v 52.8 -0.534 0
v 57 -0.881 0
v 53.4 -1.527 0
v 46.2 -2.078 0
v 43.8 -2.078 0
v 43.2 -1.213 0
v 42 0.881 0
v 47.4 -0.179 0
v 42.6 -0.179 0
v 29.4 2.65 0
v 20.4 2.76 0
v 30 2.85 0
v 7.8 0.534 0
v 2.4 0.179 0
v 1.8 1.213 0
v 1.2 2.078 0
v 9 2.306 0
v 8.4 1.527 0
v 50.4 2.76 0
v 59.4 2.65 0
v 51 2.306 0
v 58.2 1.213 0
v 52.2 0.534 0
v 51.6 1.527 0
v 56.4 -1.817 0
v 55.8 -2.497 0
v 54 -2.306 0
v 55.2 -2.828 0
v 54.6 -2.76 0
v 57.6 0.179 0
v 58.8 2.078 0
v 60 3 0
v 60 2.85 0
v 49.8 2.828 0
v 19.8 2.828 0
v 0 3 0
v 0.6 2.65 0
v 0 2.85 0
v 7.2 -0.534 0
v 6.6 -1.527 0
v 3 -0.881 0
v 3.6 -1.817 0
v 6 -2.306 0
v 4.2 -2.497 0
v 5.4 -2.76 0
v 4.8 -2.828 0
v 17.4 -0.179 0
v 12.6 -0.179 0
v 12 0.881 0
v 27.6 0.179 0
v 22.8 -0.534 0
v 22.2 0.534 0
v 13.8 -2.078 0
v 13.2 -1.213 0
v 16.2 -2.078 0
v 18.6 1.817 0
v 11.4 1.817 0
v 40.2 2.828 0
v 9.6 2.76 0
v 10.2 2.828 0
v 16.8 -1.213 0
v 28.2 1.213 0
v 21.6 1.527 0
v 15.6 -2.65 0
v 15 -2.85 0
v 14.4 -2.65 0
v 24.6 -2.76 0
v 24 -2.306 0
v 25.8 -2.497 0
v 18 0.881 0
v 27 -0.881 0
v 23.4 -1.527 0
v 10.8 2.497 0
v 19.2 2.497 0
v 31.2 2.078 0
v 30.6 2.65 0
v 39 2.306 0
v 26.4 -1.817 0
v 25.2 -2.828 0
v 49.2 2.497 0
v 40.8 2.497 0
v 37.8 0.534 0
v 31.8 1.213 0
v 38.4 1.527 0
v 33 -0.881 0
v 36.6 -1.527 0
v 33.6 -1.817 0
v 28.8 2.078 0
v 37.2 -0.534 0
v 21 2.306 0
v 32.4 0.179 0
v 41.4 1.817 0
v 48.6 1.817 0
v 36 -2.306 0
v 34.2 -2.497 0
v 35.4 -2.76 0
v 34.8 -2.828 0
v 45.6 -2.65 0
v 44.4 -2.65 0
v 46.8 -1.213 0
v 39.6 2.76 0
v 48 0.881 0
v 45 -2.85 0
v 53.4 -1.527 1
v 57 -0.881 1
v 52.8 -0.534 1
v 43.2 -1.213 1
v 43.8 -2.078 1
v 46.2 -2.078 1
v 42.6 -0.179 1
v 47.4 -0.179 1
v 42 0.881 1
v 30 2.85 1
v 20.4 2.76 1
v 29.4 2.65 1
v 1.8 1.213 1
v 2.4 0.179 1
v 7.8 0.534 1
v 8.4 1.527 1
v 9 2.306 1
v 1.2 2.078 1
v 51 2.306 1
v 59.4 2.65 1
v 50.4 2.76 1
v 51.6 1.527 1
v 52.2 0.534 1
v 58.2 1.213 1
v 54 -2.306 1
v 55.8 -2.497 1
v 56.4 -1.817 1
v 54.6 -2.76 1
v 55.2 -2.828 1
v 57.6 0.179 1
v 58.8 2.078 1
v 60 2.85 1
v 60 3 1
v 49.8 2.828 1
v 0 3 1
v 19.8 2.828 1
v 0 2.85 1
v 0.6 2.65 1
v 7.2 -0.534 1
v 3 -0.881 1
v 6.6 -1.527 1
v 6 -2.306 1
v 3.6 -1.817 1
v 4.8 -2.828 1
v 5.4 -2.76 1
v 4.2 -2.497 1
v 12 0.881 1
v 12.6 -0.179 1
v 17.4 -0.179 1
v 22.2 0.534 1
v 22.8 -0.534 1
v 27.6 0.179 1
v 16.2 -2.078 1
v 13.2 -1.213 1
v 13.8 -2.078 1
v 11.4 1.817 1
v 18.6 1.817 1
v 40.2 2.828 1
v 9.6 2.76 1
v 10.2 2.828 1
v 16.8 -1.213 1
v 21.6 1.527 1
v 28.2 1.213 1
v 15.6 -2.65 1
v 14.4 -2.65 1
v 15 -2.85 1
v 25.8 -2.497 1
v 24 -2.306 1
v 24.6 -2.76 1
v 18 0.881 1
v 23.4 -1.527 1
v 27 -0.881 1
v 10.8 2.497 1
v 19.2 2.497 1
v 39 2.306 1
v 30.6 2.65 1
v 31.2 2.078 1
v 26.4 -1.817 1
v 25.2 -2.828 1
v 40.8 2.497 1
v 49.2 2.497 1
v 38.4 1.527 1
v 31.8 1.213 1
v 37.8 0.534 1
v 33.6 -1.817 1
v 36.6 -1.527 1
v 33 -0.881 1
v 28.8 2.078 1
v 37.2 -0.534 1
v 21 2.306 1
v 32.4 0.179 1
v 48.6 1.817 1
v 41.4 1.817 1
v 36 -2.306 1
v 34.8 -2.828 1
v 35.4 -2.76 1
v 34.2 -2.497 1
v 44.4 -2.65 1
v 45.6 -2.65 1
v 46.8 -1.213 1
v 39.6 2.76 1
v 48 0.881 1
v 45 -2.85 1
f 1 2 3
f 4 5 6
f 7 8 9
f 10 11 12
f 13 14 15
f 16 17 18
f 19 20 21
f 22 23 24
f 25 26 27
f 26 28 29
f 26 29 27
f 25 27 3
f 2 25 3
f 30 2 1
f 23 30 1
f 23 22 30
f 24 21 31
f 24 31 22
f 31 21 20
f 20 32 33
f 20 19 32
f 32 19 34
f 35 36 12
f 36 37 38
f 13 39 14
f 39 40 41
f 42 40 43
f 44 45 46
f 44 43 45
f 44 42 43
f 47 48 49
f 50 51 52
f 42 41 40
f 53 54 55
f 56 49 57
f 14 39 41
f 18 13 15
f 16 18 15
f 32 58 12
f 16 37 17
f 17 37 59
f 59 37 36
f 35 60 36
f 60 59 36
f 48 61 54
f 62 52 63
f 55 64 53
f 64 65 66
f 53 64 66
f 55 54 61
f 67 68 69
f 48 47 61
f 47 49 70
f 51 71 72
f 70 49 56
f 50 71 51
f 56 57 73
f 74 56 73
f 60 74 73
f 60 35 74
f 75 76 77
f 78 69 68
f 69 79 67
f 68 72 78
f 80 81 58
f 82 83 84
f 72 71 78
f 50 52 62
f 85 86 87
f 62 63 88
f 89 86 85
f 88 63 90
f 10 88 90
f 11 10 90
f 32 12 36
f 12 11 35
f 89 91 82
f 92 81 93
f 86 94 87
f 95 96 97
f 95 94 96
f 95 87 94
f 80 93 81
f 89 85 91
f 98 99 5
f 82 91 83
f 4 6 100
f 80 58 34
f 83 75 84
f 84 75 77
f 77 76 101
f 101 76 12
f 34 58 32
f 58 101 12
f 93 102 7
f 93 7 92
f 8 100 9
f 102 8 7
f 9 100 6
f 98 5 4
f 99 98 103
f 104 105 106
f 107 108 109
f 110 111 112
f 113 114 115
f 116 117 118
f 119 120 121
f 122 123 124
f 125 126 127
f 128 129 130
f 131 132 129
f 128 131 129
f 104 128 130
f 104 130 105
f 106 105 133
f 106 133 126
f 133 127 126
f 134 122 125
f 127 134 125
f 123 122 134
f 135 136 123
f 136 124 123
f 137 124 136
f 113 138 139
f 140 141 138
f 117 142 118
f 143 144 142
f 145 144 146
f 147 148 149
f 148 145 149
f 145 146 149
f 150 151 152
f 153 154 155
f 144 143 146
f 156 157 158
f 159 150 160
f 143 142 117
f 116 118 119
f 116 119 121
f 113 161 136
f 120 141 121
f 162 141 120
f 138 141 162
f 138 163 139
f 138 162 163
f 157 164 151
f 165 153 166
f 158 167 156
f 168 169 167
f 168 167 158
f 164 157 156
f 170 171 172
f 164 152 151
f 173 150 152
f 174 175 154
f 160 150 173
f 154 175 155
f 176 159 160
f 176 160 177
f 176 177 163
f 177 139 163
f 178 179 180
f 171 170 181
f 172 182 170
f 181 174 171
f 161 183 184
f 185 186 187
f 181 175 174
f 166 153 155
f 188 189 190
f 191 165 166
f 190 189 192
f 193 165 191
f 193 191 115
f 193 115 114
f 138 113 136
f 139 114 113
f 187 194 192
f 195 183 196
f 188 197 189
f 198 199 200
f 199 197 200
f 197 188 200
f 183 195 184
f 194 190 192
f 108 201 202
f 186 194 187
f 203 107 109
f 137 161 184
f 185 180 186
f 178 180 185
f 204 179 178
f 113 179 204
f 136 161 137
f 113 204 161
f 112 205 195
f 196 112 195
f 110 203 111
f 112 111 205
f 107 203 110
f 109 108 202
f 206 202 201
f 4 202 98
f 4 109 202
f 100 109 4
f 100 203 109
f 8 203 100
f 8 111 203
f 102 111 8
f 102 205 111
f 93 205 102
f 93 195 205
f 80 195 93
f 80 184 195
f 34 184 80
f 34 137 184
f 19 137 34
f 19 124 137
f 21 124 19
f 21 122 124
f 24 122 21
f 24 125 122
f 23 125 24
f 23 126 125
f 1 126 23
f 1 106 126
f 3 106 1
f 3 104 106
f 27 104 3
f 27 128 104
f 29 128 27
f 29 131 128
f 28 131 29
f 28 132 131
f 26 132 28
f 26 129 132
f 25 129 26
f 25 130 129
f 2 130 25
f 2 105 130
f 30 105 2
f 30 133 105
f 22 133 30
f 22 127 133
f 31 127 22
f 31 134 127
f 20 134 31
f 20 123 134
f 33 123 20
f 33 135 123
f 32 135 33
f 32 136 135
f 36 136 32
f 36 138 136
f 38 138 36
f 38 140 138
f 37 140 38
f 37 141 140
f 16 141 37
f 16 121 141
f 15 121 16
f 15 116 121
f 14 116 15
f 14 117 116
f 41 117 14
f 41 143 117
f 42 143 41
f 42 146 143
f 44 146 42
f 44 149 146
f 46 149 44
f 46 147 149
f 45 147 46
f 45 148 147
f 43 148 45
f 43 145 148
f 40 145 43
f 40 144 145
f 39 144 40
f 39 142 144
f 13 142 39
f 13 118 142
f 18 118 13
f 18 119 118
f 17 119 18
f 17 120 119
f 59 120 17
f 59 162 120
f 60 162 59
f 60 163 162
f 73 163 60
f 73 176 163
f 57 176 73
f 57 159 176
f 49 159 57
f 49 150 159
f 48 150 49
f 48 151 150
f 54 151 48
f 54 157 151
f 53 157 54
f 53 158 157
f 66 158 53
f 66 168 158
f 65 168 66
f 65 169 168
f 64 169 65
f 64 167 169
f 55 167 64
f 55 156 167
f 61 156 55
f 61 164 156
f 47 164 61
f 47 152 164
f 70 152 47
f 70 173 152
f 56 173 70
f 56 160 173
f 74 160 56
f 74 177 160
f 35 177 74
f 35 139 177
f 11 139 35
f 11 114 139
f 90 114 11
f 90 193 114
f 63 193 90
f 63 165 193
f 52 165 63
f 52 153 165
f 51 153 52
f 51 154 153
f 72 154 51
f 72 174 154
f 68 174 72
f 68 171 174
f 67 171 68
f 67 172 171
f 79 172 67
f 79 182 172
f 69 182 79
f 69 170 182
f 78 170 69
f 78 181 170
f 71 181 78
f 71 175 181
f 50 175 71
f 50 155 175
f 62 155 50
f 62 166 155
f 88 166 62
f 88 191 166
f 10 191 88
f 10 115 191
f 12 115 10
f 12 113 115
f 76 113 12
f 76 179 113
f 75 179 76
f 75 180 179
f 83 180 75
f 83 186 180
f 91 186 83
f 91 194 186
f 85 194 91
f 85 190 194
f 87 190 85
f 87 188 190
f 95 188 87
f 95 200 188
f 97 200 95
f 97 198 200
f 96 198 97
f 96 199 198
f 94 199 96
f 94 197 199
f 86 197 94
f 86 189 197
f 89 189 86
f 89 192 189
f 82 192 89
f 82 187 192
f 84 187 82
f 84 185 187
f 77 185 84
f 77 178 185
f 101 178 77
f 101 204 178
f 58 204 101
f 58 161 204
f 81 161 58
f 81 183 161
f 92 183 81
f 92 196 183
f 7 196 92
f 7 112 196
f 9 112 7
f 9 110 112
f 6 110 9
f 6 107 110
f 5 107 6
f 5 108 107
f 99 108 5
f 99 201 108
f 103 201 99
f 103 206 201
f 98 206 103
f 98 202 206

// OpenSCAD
module sinuskante(laenge, breite, dicke) {
  segments = 100;
  echo("start", points);
  points = [for (i = [0:segments]) 
      let(
      x = i * laenge / segments,
          y = breite*0.95*sin(90 + x * 360/laenge * round(laenge/10))
      )
      [x, y]
      ];
  
  linear_extrude(height = dicke)
    polygon(concat(points, [[laenge, breite], [0, breite]]));
}



  sinuskante(laenge=60, breite=3, dicke=1);
